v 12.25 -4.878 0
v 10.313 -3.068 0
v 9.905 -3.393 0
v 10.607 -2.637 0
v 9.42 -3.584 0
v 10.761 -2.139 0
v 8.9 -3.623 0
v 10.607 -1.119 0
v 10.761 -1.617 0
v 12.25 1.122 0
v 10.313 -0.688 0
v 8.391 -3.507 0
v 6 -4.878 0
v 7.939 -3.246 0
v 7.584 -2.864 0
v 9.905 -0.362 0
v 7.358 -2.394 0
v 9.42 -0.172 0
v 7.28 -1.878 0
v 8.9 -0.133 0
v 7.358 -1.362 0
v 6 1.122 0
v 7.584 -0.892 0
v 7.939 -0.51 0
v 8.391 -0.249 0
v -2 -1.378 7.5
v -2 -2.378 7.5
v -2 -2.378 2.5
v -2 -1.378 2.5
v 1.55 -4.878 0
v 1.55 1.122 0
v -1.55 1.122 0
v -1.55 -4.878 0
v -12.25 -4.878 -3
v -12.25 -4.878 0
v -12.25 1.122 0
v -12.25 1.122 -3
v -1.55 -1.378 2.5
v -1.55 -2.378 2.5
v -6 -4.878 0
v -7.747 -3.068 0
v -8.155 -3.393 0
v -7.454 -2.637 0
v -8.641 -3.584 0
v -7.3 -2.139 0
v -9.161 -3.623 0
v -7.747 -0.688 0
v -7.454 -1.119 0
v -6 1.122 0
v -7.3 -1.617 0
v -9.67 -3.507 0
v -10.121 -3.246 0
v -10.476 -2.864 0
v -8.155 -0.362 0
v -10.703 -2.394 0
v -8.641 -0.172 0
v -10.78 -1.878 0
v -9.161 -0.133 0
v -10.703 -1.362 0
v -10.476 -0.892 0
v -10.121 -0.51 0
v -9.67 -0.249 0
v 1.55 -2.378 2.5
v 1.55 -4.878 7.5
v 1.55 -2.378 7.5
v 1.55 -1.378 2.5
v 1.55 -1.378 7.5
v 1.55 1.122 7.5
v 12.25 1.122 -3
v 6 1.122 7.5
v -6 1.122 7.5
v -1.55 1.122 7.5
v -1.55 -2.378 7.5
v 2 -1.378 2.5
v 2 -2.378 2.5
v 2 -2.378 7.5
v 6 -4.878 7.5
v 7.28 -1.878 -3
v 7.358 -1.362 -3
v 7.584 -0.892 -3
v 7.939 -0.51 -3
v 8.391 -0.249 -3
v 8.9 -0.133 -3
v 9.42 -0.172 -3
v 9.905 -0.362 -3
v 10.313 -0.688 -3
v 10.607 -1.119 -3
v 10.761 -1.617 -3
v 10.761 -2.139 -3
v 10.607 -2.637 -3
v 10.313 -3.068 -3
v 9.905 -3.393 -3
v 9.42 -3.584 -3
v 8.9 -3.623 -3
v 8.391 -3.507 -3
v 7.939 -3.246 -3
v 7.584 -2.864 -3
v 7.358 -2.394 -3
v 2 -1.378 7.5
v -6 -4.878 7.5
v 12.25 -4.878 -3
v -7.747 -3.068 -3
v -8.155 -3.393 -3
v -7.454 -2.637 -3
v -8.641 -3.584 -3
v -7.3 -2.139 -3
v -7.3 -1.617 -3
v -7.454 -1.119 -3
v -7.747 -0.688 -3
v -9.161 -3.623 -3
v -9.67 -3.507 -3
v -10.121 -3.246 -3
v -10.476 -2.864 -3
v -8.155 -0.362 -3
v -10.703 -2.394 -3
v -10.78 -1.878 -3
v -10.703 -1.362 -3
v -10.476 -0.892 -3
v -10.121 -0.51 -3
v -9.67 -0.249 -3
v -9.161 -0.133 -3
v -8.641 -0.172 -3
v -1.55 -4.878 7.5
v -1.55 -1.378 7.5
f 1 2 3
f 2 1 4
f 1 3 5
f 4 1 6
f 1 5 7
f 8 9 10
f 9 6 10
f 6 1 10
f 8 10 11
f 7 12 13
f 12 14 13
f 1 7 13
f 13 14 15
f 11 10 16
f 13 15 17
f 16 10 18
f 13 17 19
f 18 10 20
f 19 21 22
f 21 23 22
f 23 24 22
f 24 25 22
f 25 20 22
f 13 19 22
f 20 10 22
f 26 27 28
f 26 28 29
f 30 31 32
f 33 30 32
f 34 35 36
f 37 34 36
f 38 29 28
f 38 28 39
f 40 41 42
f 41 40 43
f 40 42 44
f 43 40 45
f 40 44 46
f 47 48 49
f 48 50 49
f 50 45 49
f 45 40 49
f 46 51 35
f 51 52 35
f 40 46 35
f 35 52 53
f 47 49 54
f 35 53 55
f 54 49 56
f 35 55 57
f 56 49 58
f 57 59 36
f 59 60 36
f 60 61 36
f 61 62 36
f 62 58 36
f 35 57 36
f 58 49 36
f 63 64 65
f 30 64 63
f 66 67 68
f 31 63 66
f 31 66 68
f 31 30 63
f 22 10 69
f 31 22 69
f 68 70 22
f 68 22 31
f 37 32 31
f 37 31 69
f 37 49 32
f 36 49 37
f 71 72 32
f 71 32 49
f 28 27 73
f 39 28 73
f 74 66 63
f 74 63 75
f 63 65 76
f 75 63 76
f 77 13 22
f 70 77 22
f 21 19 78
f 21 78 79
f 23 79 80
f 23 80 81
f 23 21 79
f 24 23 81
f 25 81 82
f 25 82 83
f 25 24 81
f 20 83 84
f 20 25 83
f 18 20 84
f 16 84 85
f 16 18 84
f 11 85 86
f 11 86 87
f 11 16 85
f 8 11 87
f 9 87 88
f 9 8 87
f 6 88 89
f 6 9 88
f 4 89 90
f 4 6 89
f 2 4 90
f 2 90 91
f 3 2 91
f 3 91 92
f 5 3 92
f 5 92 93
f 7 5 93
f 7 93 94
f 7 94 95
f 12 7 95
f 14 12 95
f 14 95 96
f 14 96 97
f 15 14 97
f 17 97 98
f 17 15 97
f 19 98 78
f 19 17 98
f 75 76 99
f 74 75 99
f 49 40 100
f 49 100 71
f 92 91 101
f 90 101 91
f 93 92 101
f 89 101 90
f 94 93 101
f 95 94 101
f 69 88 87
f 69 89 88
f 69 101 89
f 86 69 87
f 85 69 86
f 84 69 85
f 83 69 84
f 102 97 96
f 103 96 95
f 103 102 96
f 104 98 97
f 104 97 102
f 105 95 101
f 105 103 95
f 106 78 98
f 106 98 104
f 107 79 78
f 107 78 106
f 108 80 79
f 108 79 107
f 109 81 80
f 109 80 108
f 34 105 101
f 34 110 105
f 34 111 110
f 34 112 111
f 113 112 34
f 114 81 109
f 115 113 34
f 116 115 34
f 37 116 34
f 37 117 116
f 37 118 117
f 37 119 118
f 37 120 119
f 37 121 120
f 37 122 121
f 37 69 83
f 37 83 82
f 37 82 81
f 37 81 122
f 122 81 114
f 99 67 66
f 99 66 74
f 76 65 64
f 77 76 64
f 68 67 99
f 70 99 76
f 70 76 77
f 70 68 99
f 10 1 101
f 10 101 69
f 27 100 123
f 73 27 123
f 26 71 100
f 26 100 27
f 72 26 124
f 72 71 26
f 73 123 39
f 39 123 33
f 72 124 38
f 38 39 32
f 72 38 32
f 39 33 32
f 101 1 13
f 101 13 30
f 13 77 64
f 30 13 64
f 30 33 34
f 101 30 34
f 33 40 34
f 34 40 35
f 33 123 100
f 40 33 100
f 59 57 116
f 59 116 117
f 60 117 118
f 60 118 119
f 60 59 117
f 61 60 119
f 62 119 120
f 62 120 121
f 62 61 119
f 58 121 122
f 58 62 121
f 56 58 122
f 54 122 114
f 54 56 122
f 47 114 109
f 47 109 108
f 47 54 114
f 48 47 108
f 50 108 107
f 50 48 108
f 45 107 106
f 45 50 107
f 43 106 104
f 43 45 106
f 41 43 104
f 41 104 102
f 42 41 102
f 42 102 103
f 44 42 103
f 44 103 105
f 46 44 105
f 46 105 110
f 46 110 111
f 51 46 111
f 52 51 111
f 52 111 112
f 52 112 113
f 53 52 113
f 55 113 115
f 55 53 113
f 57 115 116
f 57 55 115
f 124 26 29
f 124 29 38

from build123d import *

# Parameters (mm, degrees)
SKETCH1_W             = 4.45
SKETCH1_H             = 6
BOSS_EXTRUDE1_DEPTH   = 7.5
BOSS_EXTRUDE1_2_DEPTH = 7.5
SKETCH2_W             = 6.25
SKETCH2_H             = 6
SKETCH2_R             = 1.75
SKETCH2_W_2           = 4.260679938
SKETCH2_W_3           = 0.189320062
SKETCH2_W_4           = 7.55
BOSS_EXTRUDE2_DEPTH   = 3
SKETCH3_W             = 4
SKETCH3_H             = 1
CUT_EXTRUDE1_DEPTH    = 5


with BuildPart() as part:
    # Sketch1 → Boss-Extrude1 (new body)
    with BuildSketch(Plane.XY):
        with Locations((-3.775, -1.877941176)):
            Rectangle(SKETCH1_W, SKETCH1_H)
    extrude(amount=BOSS_EXTRUDE1_DEPTH)



with BuildPart() as body_2:
    # Sketch1 → Boss-Extrude1 2 (new body)
    with BuildSketch(Plane.XY):
        with Locations((3.775, -1.877941176)):
            Rectangle(SKETCH1_W, SKETCH1_H)
    extrude(amount=BOSS_EXTRUDE1_2_DEPTH)


with BuildPart() as part_1:
    add(part.part)

    add(body_2.part)  # Boss-Extrude2 merges body 2
    # Sketch2 → Boss-Extrude2 (add)
    # profile 1 of 5: a face of its own
    with BuildSketch(Plane(origin=(0, 0, 0), x_dir=(-1, 0, 0), z_dir=(0, 0, -1))):
        with Locations((-9.125, -1.877941176)):
            Rectangle(SKETCH2_W, SKETCH2_H)
        with Locations((-9.030339969, -1.877941176)):
            Circle(SKETCH2_R, mode=Mode.SUBTRACT)
    # profile 2 of 5: a face of its own
    with BuildSketch(Plane(origin=(0, 0, 0), x_dir=(-1, 0, 0), z_dir=(0, 0, -1))):
        with Locations((-3.680339969, -1.877941176)):
            Rectangle(SKETCH2_W_2, SKETCH2_H)
    # profile 3 of 5: a face of its own
    with BuildSketch(Plane(origin=(0, 0, 0), x_dir=(-1, 0, 0), z_dir=(0, 0, -1))):
        with Locations((-5.905339969, -1.877941176)):
            Rectangle(SKETCH2_W_3, SKETCH2_H)
    # profile 4 of 5: a face of its own
    with BuildSketch(Plane(origin=(0, 0, 0), x_dir=(-1, 0, 0), z_dir=(0, 0, -1))):
        with Locations((2.225, -1.877941176)):
            Rectangle(SKETCH2_W_4, SKETCH2_H)
    # profile 5 of 5: a face of its own
    with BuildSketch(Plane(origin=(0, 0, 0), x_dir=(-1, 0, 0), z_dir=(0, 0, -1))):
        with Locations((9.125, -1.877941176)):
            Rectangle(SKETCH2_W, SKETCH2_H)
        with Locations((9.030339969, -1.877941176)):
            Circle(SKETCH2_R, mode=Mode.SUBTRACT)
    extrude(amount=BOSS_EXTRUDE2_DEPTH)

    # Sketch3 → Cut-Extrude1 (cut)
    with BuildSketch(Plane.XY.offset(7.5)):
        with Locations((0, -1.877941176)):
            Rectangle(SKETCH3_W, SKETCH3_H)
    extrude(amount=-CUT_EXTRUDE1_DEPTH, mode=Mode.SUBTRACT)


solid = part_1.part
